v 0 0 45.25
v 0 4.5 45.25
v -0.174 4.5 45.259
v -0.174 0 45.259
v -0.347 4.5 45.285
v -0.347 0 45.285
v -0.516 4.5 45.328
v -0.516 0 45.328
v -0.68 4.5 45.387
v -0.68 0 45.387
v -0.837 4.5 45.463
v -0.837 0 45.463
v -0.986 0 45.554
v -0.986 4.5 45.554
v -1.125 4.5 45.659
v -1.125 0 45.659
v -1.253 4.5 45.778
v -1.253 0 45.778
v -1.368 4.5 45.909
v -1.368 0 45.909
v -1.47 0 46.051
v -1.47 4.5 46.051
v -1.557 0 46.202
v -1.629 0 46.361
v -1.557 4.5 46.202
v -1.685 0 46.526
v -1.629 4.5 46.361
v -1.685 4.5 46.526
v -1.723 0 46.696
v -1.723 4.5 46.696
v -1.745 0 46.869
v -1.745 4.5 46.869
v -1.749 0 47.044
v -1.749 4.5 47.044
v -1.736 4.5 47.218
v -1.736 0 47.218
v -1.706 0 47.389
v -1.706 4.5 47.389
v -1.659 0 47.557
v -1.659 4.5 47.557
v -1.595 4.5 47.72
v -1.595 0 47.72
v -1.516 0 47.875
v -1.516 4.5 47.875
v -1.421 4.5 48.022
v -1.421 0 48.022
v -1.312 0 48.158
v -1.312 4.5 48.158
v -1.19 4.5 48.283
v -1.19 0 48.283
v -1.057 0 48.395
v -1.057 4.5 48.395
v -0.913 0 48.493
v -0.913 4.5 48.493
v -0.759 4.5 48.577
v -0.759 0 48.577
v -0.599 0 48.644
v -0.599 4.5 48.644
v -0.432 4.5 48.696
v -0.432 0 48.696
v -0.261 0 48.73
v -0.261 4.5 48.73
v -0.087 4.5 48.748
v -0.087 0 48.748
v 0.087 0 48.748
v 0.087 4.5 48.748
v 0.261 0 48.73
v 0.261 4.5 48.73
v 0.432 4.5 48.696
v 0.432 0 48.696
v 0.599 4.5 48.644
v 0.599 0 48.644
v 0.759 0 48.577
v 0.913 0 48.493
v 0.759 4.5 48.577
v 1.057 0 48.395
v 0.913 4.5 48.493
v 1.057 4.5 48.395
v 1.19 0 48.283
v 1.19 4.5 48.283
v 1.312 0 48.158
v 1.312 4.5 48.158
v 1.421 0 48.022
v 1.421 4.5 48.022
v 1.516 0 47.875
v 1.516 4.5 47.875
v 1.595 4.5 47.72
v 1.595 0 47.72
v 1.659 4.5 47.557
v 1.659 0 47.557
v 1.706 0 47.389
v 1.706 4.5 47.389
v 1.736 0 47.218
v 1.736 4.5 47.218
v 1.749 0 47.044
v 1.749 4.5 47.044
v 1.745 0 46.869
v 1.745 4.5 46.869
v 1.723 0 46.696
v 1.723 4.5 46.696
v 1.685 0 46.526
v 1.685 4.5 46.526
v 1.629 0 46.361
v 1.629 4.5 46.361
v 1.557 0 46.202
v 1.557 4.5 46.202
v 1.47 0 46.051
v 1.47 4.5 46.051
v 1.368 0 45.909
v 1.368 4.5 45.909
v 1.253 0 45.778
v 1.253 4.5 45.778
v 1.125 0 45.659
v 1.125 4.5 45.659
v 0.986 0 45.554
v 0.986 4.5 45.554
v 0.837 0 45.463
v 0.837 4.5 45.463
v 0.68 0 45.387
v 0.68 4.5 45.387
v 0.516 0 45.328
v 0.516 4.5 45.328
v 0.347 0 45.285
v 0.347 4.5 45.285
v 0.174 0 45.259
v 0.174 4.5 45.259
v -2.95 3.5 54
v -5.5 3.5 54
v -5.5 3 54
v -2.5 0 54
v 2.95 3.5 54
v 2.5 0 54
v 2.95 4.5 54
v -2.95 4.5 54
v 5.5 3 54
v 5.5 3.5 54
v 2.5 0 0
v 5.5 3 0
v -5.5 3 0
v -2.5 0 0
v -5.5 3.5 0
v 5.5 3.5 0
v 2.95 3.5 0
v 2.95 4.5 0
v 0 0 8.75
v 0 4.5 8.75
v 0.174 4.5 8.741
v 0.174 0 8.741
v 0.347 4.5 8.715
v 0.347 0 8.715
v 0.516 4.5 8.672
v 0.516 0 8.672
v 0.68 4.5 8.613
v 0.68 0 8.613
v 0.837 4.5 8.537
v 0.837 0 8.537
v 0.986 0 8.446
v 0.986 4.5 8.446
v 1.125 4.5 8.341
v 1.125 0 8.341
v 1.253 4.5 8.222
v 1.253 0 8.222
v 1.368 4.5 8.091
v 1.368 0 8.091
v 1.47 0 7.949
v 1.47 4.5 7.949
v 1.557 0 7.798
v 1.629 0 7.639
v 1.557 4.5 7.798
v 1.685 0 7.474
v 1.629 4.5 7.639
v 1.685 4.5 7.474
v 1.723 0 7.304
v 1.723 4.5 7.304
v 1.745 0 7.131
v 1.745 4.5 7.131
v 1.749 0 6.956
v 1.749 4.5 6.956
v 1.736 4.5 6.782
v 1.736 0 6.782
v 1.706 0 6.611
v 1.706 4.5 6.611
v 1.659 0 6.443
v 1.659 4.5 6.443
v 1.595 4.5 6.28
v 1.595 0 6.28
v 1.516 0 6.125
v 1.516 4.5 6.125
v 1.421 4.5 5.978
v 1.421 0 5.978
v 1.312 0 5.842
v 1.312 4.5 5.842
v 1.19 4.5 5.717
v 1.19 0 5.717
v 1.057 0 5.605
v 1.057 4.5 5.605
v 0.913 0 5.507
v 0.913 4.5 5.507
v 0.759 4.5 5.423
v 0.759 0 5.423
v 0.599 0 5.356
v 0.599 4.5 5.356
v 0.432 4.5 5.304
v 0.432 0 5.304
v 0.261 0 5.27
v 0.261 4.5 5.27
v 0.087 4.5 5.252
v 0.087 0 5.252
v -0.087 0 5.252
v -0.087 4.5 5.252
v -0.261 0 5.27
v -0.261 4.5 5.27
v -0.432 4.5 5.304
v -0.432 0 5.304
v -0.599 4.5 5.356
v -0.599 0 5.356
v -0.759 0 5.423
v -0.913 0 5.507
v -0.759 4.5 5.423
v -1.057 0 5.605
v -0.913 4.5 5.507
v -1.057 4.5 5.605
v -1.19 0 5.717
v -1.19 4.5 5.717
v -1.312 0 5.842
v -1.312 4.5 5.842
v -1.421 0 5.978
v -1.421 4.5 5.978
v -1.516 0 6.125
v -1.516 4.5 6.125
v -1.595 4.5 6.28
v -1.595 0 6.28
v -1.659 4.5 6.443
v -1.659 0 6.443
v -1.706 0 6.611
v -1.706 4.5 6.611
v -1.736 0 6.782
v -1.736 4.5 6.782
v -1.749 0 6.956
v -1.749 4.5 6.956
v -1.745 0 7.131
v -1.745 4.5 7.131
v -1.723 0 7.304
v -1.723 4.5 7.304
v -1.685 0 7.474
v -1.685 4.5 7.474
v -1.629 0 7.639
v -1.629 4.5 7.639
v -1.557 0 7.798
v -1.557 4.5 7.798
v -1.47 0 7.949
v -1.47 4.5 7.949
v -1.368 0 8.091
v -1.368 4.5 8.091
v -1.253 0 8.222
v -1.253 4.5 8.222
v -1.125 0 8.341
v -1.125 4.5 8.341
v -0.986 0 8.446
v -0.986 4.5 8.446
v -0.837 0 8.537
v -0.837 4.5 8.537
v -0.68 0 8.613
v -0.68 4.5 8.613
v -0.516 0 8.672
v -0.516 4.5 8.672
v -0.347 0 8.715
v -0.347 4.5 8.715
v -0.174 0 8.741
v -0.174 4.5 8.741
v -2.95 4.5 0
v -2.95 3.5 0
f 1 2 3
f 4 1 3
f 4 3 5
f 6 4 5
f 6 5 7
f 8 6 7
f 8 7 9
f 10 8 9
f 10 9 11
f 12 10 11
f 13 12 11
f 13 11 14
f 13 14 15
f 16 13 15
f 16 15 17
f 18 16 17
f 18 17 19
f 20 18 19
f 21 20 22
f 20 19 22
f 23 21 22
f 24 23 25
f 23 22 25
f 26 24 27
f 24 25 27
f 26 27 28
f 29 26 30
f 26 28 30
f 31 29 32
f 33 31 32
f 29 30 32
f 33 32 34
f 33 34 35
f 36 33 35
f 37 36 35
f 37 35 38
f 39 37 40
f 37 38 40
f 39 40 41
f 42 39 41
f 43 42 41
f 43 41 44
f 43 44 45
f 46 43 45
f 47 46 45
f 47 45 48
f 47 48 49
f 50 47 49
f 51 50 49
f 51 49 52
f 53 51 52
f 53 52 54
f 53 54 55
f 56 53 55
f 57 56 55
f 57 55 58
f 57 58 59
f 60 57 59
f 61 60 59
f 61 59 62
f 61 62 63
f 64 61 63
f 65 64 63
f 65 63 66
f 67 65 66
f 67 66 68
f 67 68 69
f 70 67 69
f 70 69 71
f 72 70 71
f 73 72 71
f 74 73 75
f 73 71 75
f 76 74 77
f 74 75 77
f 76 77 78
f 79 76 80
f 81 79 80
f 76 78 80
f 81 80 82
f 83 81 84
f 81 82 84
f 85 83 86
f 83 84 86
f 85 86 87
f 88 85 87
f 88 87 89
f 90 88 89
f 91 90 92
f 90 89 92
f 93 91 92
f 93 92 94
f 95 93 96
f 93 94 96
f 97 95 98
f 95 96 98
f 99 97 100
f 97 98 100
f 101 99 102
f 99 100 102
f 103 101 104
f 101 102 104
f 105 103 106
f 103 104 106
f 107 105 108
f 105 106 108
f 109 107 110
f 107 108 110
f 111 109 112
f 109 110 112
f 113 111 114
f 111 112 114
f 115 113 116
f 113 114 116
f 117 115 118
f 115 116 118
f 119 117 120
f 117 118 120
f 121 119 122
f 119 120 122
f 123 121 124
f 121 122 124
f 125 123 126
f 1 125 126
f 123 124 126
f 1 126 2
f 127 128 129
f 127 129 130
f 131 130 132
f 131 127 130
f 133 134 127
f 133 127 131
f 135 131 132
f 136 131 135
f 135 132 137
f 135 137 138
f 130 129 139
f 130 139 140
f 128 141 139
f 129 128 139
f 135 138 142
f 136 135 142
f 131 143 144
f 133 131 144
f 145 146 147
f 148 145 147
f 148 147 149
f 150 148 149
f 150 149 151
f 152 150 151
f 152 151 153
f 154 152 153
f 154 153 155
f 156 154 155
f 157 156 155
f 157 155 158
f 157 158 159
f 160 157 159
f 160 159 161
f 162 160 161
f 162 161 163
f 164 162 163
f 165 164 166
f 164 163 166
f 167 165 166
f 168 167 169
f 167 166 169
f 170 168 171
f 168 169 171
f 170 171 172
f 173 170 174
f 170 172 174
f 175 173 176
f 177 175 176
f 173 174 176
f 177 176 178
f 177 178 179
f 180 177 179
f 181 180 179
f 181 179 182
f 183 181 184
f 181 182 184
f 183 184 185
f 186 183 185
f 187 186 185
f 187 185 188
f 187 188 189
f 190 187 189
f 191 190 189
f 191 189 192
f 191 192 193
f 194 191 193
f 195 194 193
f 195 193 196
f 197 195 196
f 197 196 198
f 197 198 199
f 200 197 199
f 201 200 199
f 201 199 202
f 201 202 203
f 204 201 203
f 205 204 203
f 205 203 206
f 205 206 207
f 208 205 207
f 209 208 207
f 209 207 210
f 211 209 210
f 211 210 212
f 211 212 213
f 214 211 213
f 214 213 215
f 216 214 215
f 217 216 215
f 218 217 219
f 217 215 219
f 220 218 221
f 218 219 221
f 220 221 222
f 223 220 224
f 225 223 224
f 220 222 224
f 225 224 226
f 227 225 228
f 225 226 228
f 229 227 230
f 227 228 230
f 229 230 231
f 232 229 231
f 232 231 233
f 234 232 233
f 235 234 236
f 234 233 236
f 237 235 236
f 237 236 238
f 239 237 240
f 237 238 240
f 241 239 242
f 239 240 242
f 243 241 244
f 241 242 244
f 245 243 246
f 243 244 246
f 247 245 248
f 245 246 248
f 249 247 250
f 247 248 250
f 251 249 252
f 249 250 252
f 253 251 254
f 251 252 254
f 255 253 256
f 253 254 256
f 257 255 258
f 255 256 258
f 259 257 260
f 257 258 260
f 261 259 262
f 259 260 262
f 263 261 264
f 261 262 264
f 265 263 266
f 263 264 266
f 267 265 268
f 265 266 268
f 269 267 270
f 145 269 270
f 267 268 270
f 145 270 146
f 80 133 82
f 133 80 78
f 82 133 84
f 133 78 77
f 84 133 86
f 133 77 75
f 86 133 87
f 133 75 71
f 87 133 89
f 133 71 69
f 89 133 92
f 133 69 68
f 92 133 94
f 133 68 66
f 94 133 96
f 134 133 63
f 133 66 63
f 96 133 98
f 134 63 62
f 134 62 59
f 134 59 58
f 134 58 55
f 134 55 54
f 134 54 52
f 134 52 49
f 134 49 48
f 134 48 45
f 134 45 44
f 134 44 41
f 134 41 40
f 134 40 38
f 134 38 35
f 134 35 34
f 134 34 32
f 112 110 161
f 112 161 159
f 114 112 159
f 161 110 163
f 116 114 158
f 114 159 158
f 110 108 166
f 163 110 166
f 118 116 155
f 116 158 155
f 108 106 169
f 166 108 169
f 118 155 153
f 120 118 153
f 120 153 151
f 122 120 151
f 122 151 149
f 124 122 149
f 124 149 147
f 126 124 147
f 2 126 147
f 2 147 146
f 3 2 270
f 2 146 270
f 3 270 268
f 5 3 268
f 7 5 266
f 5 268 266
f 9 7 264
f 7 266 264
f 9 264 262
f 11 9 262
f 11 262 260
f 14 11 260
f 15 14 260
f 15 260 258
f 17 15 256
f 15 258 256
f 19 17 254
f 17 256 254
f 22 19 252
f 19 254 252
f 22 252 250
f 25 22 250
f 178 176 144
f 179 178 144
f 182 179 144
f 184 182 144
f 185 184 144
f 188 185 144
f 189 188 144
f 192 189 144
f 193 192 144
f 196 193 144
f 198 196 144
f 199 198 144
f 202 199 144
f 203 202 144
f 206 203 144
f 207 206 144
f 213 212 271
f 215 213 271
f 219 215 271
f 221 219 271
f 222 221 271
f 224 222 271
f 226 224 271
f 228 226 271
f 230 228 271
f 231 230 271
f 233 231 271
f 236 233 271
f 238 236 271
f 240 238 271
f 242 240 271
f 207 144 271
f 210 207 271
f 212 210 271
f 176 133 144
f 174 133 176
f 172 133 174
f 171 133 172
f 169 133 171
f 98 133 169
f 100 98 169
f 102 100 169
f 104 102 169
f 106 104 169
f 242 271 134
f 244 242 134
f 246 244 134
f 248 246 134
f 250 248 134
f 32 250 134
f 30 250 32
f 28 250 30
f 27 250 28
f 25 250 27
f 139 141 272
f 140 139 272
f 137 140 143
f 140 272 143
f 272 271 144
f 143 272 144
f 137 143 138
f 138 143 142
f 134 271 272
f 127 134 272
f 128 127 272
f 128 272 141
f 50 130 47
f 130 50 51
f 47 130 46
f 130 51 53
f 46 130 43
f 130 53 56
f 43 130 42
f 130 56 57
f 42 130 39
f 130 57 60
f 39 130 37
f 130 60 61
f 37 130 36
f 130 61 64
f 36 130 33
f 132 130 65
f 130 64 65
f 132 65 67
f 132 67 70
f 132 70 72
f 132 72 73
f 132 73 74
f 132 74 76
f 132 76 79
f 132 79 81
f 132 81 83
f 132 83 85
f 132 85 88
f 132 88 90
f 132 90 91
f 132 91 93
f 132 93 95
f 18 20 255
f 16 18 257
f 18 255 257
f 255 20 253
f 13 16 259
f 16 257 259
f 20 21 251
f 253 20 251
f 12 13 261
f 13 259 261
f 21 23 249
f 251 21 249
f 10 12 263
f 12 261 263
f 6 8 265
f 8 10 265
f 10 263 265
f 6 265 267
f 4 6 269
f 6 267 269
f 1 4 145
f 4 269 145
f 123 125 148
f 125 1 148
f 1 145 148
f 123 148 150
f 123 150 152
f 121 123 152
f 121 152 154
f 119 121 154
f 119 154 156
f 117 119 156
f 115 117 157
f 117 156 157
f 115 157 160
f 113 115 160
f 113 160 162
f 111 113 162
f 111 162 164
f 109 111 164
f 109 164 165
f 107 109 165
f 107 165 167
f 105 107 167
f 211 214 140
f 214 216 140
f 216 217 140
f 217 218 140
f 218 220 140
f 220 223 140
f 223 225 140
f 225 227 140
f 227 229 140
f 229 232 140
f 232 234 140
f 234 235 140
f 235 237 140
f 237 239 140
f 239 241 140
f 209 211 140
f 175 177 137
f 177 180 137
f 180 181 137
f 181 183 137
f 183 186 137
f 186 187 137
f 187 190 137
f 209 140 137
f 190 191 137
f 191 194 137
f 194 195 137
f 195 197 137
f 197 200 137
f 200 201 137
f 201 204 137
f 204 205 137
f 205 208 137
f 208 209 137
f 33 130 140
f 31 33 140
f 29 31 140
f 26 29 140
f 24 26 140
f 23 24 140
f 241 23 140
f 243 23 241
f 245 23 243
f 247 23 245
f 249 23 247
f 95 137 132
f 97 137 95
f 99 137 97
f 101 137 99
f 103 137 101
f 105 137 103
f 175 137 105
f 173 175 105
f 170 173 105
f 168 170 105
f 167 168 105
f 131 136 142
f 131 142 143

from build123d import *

# Parameters (mm, degrees)
BOSS_EXTRU_1_DEPTH      = 54
ESQUISSE2_R             = 1.75
ENL_V_MAT_EXTRU_1_DEPTH = 55.465585465


with BuildPart() as part:
    # Esquisse1 → Boss.-Extru.1 (new body)
    with BuildSketch(Plane.XY):
        Polygon((-2.5, 0), (2.5, 0), (5.5, 3), (5.5, 3.5), (2.95, 3.5), (2.95, 4.5), (-2.95, 4.5), (-2.95, 3.5), (-5.5, 3.5), (-5.5, 3), align=None)
    extrude(amount=BOSS_EXTRU_1_DEPTH)

    # Esquisse2 → Enlèv. mat.-Extru.1 (cut, through all)
    with BuildSketch(Plane(origin=(0, 4.5, 0), x_dir=(1, 0, 0), z_dir=(0, 1, 0))):
        with Locations(Location((0, -7, 0), (0, 0, 270))):
            Circle(ESQUISSE2_R)
        with Locations(Location((0, -47, 0), (0, 0, 90))):
            Circle(ESQUISSE2_R)
    extrude(amount=-ENL_V_MAT_EXTRU_1_DEPTH, mode=Mode.SUBTRACT)


solid = part.part
